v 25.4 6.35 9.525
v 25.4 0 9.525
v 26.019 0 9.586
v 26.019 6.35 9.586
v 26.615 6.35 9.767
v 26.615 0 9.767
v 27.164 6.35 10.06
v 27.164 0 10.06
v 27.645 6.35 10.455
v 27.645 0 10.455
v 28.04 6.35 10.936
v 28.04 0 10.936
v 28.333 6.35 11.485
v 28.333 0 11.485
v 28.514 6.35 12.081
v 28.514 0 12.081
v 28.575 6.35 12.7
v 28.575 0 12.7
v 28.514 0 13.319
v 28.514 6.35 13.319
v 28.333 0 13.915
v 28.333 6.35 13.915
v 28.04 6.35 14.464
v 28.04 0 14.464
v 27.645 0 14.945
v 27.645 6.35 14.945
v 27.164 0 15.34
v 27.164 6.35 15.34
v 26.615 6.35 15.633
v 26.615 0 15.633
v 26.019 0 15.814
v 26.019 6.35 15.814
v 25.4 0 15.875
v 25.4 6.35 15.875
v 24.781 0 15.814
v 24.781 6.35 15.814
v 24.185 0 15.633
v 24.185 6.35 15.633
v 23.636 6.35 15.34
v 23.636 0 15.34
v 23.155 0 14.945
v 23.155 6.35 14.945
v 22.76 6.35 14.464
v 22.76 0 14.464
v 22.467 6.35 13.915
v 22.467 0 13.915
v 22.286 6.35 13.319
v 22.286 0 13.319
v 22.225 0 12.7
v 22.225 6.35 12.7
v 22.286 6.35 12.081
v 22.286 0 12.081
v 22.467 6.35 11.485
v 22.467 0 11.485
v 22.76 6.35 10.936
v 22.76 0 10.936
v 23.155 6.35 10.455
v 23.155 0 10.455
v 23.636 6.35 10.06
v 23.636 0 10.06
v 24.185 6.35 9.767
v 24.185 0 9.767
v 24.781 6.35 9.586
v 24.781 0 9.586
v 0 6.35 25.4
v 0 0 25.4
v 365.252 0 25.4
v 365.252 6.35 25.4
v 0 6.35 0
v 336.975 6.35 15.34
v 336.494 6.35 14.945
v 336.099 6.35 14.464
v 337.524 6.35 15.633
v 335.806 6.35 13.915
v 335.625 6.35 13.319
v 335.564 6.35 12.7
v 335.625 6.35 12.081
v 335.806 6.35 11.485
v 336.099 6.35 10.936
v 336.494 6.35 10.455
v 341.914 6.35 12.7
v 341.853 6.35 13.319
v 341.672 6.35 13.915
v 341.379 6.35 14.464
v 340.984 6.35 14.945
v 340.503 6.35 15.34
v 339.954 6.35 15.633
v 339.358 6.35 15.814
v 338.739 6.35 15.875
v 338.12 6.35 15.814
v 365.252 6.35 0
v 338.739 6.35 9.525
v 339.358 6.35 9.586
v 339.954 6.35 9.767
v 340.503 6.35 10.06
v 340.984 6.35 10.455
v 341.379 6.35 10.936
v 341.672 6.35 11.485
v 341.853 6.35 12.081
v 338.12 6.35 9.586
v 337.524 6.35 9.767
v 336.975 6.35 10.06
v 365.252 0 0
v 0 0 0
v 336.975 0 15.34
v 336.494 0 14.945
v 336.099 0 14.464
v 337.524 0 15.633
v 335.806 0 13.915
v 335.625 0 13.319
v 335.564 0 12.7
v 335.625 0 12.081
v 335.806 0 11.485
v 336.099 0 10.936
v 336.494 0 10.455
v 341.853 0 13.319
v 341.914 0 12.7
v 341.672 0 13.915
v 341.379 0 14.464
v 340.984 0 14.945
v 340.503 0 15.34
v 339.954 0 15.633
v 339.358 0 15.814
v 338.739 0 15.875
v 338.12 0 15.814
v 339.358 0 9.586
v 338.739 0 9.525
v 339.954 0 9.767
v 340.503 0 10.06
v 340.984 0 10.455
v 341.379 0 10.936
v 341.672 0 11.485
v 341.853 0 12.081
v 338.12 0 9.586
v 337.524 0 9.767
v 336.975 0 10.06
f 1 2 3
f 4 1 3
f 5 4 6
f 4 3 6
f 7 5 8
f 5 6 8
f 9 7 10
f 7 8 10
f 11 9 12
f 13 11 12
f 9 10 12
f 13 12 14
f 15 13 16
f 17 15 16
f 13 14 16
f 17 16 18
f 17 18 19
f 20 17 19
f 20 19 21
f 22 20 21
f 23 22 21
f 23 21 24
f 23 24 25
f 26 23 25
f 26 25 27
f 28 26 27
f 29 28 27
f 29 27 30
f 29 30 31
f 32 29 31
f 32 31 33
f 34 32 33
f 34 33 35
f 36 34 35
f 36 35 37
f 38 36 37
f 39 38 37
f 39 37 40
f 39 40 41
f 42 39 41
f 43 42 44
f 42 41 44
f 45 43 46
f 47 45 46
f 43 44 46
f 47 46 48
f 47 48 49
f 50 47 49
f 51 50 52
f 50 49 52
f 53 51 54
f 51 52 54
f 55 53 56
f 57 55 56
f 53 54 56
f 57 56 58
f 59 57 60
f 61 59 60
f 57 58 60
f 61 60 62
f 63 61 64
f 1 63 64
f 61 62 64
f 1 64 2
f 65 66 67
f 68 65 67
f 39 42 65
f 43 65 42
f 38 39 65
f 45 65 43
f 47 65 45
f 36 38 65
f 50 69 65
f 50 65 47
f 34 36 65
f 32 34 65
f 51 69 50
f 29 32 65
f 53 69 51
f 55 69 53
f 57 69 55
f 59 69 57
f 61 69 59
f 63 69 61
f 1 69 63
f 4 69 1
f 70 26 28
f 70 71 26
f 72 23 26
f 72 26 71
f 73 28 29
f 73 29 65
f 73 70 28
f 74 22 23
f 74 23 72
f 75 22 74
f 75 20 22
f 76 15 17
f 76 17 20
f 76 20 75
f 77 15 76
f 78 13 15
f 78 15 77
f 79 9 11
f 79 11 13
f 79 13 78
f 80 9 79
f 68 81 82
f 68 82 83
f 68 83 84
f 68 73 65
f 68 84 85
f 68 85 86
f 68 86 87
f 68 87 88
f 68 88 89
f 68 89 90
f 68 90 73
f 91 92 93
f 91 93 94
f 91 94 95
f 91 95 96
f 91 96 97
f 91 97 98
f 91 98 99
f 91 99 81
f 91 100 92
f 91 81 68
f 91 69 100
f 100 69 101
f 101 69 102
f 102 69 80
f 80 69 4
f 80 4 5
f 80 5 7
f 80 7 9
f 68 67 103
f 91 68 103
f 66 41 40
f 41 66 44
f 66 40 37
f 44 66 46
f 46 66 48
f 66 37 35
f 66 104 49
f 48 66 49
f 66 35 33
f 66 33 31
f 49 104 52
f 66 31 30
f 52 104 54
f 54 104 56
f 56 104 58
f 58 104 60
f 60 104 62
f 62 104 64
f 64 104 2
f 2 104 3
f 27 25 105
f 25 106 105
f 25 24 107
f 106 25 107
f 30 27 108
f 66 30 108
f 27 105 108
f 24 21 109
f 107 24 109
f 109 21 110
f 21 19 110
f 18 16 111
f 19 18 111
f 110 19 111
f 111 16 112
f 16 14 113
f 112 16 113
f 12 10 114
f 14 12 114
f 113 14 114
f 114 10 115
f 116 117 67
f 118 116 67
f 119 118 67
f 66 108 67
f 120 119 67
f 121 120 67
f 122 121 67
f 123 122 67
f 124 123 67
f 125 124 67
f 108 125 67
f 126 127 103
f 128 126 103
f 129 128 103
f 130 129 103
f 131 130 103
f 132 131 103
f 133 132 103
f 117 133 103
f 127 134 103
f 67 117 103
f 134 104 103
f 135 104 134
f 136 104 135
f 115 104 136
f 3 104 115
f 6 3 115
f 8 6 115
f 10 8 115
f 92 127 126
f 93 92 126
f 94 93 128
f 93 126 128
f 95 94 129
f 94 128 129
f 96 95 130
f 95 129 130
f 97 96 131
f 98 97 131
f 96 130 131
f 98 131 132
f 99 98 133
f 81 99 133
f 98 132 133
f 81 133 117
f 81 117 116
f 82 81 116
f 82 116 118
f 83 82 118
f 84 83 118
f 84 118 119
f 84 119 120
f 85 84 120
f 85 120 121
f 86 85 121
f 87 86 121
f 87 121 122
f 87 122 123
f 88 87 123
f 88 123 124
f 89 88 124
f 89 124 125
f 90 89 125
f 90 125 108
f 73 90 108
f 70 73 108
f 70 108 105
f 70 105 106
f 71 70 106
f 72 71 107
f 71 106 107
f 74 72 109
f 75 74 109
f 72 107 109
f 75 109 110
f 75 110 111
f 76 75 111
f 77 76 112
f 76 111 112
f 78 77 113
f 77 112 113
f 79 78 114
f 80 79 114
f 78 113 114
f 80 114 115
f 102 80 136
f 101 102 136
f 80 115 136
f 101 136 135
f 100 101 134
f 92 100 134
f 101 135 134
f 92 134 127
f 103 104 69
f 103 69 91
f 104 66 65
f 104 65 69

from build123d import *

# Parameters (mm, degrees)
SKETCH1_W           = 365.252
SKETCH1_H           = 25.4
BOSS_EXTRUDE1_DEPTH = 6.35
CUT_EXTRUDE1_REACH  = 368.189
SKETCH2_R           = 3.175


with BuildPart() as part:
    # Sketch1 → Boss-Extrude1 (new body)
    with BuildSketch(Plane(origin=(0, 0, 0), x_dir=(1, 0, 0), z_dir=(0, 1, 0))):
        with Locations((182.626, -12.7)):
            Rectangle(SKETCH1_W, SKETCH1_H)
    extrude(amount=BOSS_EXTRUDE1_DEPTH)

    # Sketch2 → Cut-Extrude1 (cut, up to next)
    with BuildSketch(Plane.XZ, mode=Mode.PRIVATE) as cut_extrude1_sk1:
        with Locations(Location((25.4, 12.7, 0), (0, 0, 270))):
            Circle(SKETCH2_R)
    cut_extrude1_tool1 = extrude(cut_extrude1_sk1.sketch, amount=-CUT_EXTRUDE1_REACH, mode=Mode.PRIVATE) & part.part
    # Sketch2 → Cut-Extrude1 (cut, up to next)
    with BuildSketch(Plane.XZ, mode=Mode.PRIVATE) as cut_extrude1_sk2:
        with Locations(Location((338.738972, 12.7, 0), (0, 0, 270))):
            Circle(SKETCH2_R)
    cut_extrude1_tool2 = extrude(cut_extrude1_sk2.sketch, amount=-CUT_EXTRUDE1_REACH, mode=Mode.PRIVATE) & part.part
    add(cut_extrude1_tool1.solids().sort_by_distance((25.4, 0, 12.7))[0], mode=Mode.SUBTRACT)
    add(cut_extrude1_tool2.solids().sort_by_distance((338.738972, 0, 12.7))[0], mode=Mode.SUBTRACT)


solid = part.part
